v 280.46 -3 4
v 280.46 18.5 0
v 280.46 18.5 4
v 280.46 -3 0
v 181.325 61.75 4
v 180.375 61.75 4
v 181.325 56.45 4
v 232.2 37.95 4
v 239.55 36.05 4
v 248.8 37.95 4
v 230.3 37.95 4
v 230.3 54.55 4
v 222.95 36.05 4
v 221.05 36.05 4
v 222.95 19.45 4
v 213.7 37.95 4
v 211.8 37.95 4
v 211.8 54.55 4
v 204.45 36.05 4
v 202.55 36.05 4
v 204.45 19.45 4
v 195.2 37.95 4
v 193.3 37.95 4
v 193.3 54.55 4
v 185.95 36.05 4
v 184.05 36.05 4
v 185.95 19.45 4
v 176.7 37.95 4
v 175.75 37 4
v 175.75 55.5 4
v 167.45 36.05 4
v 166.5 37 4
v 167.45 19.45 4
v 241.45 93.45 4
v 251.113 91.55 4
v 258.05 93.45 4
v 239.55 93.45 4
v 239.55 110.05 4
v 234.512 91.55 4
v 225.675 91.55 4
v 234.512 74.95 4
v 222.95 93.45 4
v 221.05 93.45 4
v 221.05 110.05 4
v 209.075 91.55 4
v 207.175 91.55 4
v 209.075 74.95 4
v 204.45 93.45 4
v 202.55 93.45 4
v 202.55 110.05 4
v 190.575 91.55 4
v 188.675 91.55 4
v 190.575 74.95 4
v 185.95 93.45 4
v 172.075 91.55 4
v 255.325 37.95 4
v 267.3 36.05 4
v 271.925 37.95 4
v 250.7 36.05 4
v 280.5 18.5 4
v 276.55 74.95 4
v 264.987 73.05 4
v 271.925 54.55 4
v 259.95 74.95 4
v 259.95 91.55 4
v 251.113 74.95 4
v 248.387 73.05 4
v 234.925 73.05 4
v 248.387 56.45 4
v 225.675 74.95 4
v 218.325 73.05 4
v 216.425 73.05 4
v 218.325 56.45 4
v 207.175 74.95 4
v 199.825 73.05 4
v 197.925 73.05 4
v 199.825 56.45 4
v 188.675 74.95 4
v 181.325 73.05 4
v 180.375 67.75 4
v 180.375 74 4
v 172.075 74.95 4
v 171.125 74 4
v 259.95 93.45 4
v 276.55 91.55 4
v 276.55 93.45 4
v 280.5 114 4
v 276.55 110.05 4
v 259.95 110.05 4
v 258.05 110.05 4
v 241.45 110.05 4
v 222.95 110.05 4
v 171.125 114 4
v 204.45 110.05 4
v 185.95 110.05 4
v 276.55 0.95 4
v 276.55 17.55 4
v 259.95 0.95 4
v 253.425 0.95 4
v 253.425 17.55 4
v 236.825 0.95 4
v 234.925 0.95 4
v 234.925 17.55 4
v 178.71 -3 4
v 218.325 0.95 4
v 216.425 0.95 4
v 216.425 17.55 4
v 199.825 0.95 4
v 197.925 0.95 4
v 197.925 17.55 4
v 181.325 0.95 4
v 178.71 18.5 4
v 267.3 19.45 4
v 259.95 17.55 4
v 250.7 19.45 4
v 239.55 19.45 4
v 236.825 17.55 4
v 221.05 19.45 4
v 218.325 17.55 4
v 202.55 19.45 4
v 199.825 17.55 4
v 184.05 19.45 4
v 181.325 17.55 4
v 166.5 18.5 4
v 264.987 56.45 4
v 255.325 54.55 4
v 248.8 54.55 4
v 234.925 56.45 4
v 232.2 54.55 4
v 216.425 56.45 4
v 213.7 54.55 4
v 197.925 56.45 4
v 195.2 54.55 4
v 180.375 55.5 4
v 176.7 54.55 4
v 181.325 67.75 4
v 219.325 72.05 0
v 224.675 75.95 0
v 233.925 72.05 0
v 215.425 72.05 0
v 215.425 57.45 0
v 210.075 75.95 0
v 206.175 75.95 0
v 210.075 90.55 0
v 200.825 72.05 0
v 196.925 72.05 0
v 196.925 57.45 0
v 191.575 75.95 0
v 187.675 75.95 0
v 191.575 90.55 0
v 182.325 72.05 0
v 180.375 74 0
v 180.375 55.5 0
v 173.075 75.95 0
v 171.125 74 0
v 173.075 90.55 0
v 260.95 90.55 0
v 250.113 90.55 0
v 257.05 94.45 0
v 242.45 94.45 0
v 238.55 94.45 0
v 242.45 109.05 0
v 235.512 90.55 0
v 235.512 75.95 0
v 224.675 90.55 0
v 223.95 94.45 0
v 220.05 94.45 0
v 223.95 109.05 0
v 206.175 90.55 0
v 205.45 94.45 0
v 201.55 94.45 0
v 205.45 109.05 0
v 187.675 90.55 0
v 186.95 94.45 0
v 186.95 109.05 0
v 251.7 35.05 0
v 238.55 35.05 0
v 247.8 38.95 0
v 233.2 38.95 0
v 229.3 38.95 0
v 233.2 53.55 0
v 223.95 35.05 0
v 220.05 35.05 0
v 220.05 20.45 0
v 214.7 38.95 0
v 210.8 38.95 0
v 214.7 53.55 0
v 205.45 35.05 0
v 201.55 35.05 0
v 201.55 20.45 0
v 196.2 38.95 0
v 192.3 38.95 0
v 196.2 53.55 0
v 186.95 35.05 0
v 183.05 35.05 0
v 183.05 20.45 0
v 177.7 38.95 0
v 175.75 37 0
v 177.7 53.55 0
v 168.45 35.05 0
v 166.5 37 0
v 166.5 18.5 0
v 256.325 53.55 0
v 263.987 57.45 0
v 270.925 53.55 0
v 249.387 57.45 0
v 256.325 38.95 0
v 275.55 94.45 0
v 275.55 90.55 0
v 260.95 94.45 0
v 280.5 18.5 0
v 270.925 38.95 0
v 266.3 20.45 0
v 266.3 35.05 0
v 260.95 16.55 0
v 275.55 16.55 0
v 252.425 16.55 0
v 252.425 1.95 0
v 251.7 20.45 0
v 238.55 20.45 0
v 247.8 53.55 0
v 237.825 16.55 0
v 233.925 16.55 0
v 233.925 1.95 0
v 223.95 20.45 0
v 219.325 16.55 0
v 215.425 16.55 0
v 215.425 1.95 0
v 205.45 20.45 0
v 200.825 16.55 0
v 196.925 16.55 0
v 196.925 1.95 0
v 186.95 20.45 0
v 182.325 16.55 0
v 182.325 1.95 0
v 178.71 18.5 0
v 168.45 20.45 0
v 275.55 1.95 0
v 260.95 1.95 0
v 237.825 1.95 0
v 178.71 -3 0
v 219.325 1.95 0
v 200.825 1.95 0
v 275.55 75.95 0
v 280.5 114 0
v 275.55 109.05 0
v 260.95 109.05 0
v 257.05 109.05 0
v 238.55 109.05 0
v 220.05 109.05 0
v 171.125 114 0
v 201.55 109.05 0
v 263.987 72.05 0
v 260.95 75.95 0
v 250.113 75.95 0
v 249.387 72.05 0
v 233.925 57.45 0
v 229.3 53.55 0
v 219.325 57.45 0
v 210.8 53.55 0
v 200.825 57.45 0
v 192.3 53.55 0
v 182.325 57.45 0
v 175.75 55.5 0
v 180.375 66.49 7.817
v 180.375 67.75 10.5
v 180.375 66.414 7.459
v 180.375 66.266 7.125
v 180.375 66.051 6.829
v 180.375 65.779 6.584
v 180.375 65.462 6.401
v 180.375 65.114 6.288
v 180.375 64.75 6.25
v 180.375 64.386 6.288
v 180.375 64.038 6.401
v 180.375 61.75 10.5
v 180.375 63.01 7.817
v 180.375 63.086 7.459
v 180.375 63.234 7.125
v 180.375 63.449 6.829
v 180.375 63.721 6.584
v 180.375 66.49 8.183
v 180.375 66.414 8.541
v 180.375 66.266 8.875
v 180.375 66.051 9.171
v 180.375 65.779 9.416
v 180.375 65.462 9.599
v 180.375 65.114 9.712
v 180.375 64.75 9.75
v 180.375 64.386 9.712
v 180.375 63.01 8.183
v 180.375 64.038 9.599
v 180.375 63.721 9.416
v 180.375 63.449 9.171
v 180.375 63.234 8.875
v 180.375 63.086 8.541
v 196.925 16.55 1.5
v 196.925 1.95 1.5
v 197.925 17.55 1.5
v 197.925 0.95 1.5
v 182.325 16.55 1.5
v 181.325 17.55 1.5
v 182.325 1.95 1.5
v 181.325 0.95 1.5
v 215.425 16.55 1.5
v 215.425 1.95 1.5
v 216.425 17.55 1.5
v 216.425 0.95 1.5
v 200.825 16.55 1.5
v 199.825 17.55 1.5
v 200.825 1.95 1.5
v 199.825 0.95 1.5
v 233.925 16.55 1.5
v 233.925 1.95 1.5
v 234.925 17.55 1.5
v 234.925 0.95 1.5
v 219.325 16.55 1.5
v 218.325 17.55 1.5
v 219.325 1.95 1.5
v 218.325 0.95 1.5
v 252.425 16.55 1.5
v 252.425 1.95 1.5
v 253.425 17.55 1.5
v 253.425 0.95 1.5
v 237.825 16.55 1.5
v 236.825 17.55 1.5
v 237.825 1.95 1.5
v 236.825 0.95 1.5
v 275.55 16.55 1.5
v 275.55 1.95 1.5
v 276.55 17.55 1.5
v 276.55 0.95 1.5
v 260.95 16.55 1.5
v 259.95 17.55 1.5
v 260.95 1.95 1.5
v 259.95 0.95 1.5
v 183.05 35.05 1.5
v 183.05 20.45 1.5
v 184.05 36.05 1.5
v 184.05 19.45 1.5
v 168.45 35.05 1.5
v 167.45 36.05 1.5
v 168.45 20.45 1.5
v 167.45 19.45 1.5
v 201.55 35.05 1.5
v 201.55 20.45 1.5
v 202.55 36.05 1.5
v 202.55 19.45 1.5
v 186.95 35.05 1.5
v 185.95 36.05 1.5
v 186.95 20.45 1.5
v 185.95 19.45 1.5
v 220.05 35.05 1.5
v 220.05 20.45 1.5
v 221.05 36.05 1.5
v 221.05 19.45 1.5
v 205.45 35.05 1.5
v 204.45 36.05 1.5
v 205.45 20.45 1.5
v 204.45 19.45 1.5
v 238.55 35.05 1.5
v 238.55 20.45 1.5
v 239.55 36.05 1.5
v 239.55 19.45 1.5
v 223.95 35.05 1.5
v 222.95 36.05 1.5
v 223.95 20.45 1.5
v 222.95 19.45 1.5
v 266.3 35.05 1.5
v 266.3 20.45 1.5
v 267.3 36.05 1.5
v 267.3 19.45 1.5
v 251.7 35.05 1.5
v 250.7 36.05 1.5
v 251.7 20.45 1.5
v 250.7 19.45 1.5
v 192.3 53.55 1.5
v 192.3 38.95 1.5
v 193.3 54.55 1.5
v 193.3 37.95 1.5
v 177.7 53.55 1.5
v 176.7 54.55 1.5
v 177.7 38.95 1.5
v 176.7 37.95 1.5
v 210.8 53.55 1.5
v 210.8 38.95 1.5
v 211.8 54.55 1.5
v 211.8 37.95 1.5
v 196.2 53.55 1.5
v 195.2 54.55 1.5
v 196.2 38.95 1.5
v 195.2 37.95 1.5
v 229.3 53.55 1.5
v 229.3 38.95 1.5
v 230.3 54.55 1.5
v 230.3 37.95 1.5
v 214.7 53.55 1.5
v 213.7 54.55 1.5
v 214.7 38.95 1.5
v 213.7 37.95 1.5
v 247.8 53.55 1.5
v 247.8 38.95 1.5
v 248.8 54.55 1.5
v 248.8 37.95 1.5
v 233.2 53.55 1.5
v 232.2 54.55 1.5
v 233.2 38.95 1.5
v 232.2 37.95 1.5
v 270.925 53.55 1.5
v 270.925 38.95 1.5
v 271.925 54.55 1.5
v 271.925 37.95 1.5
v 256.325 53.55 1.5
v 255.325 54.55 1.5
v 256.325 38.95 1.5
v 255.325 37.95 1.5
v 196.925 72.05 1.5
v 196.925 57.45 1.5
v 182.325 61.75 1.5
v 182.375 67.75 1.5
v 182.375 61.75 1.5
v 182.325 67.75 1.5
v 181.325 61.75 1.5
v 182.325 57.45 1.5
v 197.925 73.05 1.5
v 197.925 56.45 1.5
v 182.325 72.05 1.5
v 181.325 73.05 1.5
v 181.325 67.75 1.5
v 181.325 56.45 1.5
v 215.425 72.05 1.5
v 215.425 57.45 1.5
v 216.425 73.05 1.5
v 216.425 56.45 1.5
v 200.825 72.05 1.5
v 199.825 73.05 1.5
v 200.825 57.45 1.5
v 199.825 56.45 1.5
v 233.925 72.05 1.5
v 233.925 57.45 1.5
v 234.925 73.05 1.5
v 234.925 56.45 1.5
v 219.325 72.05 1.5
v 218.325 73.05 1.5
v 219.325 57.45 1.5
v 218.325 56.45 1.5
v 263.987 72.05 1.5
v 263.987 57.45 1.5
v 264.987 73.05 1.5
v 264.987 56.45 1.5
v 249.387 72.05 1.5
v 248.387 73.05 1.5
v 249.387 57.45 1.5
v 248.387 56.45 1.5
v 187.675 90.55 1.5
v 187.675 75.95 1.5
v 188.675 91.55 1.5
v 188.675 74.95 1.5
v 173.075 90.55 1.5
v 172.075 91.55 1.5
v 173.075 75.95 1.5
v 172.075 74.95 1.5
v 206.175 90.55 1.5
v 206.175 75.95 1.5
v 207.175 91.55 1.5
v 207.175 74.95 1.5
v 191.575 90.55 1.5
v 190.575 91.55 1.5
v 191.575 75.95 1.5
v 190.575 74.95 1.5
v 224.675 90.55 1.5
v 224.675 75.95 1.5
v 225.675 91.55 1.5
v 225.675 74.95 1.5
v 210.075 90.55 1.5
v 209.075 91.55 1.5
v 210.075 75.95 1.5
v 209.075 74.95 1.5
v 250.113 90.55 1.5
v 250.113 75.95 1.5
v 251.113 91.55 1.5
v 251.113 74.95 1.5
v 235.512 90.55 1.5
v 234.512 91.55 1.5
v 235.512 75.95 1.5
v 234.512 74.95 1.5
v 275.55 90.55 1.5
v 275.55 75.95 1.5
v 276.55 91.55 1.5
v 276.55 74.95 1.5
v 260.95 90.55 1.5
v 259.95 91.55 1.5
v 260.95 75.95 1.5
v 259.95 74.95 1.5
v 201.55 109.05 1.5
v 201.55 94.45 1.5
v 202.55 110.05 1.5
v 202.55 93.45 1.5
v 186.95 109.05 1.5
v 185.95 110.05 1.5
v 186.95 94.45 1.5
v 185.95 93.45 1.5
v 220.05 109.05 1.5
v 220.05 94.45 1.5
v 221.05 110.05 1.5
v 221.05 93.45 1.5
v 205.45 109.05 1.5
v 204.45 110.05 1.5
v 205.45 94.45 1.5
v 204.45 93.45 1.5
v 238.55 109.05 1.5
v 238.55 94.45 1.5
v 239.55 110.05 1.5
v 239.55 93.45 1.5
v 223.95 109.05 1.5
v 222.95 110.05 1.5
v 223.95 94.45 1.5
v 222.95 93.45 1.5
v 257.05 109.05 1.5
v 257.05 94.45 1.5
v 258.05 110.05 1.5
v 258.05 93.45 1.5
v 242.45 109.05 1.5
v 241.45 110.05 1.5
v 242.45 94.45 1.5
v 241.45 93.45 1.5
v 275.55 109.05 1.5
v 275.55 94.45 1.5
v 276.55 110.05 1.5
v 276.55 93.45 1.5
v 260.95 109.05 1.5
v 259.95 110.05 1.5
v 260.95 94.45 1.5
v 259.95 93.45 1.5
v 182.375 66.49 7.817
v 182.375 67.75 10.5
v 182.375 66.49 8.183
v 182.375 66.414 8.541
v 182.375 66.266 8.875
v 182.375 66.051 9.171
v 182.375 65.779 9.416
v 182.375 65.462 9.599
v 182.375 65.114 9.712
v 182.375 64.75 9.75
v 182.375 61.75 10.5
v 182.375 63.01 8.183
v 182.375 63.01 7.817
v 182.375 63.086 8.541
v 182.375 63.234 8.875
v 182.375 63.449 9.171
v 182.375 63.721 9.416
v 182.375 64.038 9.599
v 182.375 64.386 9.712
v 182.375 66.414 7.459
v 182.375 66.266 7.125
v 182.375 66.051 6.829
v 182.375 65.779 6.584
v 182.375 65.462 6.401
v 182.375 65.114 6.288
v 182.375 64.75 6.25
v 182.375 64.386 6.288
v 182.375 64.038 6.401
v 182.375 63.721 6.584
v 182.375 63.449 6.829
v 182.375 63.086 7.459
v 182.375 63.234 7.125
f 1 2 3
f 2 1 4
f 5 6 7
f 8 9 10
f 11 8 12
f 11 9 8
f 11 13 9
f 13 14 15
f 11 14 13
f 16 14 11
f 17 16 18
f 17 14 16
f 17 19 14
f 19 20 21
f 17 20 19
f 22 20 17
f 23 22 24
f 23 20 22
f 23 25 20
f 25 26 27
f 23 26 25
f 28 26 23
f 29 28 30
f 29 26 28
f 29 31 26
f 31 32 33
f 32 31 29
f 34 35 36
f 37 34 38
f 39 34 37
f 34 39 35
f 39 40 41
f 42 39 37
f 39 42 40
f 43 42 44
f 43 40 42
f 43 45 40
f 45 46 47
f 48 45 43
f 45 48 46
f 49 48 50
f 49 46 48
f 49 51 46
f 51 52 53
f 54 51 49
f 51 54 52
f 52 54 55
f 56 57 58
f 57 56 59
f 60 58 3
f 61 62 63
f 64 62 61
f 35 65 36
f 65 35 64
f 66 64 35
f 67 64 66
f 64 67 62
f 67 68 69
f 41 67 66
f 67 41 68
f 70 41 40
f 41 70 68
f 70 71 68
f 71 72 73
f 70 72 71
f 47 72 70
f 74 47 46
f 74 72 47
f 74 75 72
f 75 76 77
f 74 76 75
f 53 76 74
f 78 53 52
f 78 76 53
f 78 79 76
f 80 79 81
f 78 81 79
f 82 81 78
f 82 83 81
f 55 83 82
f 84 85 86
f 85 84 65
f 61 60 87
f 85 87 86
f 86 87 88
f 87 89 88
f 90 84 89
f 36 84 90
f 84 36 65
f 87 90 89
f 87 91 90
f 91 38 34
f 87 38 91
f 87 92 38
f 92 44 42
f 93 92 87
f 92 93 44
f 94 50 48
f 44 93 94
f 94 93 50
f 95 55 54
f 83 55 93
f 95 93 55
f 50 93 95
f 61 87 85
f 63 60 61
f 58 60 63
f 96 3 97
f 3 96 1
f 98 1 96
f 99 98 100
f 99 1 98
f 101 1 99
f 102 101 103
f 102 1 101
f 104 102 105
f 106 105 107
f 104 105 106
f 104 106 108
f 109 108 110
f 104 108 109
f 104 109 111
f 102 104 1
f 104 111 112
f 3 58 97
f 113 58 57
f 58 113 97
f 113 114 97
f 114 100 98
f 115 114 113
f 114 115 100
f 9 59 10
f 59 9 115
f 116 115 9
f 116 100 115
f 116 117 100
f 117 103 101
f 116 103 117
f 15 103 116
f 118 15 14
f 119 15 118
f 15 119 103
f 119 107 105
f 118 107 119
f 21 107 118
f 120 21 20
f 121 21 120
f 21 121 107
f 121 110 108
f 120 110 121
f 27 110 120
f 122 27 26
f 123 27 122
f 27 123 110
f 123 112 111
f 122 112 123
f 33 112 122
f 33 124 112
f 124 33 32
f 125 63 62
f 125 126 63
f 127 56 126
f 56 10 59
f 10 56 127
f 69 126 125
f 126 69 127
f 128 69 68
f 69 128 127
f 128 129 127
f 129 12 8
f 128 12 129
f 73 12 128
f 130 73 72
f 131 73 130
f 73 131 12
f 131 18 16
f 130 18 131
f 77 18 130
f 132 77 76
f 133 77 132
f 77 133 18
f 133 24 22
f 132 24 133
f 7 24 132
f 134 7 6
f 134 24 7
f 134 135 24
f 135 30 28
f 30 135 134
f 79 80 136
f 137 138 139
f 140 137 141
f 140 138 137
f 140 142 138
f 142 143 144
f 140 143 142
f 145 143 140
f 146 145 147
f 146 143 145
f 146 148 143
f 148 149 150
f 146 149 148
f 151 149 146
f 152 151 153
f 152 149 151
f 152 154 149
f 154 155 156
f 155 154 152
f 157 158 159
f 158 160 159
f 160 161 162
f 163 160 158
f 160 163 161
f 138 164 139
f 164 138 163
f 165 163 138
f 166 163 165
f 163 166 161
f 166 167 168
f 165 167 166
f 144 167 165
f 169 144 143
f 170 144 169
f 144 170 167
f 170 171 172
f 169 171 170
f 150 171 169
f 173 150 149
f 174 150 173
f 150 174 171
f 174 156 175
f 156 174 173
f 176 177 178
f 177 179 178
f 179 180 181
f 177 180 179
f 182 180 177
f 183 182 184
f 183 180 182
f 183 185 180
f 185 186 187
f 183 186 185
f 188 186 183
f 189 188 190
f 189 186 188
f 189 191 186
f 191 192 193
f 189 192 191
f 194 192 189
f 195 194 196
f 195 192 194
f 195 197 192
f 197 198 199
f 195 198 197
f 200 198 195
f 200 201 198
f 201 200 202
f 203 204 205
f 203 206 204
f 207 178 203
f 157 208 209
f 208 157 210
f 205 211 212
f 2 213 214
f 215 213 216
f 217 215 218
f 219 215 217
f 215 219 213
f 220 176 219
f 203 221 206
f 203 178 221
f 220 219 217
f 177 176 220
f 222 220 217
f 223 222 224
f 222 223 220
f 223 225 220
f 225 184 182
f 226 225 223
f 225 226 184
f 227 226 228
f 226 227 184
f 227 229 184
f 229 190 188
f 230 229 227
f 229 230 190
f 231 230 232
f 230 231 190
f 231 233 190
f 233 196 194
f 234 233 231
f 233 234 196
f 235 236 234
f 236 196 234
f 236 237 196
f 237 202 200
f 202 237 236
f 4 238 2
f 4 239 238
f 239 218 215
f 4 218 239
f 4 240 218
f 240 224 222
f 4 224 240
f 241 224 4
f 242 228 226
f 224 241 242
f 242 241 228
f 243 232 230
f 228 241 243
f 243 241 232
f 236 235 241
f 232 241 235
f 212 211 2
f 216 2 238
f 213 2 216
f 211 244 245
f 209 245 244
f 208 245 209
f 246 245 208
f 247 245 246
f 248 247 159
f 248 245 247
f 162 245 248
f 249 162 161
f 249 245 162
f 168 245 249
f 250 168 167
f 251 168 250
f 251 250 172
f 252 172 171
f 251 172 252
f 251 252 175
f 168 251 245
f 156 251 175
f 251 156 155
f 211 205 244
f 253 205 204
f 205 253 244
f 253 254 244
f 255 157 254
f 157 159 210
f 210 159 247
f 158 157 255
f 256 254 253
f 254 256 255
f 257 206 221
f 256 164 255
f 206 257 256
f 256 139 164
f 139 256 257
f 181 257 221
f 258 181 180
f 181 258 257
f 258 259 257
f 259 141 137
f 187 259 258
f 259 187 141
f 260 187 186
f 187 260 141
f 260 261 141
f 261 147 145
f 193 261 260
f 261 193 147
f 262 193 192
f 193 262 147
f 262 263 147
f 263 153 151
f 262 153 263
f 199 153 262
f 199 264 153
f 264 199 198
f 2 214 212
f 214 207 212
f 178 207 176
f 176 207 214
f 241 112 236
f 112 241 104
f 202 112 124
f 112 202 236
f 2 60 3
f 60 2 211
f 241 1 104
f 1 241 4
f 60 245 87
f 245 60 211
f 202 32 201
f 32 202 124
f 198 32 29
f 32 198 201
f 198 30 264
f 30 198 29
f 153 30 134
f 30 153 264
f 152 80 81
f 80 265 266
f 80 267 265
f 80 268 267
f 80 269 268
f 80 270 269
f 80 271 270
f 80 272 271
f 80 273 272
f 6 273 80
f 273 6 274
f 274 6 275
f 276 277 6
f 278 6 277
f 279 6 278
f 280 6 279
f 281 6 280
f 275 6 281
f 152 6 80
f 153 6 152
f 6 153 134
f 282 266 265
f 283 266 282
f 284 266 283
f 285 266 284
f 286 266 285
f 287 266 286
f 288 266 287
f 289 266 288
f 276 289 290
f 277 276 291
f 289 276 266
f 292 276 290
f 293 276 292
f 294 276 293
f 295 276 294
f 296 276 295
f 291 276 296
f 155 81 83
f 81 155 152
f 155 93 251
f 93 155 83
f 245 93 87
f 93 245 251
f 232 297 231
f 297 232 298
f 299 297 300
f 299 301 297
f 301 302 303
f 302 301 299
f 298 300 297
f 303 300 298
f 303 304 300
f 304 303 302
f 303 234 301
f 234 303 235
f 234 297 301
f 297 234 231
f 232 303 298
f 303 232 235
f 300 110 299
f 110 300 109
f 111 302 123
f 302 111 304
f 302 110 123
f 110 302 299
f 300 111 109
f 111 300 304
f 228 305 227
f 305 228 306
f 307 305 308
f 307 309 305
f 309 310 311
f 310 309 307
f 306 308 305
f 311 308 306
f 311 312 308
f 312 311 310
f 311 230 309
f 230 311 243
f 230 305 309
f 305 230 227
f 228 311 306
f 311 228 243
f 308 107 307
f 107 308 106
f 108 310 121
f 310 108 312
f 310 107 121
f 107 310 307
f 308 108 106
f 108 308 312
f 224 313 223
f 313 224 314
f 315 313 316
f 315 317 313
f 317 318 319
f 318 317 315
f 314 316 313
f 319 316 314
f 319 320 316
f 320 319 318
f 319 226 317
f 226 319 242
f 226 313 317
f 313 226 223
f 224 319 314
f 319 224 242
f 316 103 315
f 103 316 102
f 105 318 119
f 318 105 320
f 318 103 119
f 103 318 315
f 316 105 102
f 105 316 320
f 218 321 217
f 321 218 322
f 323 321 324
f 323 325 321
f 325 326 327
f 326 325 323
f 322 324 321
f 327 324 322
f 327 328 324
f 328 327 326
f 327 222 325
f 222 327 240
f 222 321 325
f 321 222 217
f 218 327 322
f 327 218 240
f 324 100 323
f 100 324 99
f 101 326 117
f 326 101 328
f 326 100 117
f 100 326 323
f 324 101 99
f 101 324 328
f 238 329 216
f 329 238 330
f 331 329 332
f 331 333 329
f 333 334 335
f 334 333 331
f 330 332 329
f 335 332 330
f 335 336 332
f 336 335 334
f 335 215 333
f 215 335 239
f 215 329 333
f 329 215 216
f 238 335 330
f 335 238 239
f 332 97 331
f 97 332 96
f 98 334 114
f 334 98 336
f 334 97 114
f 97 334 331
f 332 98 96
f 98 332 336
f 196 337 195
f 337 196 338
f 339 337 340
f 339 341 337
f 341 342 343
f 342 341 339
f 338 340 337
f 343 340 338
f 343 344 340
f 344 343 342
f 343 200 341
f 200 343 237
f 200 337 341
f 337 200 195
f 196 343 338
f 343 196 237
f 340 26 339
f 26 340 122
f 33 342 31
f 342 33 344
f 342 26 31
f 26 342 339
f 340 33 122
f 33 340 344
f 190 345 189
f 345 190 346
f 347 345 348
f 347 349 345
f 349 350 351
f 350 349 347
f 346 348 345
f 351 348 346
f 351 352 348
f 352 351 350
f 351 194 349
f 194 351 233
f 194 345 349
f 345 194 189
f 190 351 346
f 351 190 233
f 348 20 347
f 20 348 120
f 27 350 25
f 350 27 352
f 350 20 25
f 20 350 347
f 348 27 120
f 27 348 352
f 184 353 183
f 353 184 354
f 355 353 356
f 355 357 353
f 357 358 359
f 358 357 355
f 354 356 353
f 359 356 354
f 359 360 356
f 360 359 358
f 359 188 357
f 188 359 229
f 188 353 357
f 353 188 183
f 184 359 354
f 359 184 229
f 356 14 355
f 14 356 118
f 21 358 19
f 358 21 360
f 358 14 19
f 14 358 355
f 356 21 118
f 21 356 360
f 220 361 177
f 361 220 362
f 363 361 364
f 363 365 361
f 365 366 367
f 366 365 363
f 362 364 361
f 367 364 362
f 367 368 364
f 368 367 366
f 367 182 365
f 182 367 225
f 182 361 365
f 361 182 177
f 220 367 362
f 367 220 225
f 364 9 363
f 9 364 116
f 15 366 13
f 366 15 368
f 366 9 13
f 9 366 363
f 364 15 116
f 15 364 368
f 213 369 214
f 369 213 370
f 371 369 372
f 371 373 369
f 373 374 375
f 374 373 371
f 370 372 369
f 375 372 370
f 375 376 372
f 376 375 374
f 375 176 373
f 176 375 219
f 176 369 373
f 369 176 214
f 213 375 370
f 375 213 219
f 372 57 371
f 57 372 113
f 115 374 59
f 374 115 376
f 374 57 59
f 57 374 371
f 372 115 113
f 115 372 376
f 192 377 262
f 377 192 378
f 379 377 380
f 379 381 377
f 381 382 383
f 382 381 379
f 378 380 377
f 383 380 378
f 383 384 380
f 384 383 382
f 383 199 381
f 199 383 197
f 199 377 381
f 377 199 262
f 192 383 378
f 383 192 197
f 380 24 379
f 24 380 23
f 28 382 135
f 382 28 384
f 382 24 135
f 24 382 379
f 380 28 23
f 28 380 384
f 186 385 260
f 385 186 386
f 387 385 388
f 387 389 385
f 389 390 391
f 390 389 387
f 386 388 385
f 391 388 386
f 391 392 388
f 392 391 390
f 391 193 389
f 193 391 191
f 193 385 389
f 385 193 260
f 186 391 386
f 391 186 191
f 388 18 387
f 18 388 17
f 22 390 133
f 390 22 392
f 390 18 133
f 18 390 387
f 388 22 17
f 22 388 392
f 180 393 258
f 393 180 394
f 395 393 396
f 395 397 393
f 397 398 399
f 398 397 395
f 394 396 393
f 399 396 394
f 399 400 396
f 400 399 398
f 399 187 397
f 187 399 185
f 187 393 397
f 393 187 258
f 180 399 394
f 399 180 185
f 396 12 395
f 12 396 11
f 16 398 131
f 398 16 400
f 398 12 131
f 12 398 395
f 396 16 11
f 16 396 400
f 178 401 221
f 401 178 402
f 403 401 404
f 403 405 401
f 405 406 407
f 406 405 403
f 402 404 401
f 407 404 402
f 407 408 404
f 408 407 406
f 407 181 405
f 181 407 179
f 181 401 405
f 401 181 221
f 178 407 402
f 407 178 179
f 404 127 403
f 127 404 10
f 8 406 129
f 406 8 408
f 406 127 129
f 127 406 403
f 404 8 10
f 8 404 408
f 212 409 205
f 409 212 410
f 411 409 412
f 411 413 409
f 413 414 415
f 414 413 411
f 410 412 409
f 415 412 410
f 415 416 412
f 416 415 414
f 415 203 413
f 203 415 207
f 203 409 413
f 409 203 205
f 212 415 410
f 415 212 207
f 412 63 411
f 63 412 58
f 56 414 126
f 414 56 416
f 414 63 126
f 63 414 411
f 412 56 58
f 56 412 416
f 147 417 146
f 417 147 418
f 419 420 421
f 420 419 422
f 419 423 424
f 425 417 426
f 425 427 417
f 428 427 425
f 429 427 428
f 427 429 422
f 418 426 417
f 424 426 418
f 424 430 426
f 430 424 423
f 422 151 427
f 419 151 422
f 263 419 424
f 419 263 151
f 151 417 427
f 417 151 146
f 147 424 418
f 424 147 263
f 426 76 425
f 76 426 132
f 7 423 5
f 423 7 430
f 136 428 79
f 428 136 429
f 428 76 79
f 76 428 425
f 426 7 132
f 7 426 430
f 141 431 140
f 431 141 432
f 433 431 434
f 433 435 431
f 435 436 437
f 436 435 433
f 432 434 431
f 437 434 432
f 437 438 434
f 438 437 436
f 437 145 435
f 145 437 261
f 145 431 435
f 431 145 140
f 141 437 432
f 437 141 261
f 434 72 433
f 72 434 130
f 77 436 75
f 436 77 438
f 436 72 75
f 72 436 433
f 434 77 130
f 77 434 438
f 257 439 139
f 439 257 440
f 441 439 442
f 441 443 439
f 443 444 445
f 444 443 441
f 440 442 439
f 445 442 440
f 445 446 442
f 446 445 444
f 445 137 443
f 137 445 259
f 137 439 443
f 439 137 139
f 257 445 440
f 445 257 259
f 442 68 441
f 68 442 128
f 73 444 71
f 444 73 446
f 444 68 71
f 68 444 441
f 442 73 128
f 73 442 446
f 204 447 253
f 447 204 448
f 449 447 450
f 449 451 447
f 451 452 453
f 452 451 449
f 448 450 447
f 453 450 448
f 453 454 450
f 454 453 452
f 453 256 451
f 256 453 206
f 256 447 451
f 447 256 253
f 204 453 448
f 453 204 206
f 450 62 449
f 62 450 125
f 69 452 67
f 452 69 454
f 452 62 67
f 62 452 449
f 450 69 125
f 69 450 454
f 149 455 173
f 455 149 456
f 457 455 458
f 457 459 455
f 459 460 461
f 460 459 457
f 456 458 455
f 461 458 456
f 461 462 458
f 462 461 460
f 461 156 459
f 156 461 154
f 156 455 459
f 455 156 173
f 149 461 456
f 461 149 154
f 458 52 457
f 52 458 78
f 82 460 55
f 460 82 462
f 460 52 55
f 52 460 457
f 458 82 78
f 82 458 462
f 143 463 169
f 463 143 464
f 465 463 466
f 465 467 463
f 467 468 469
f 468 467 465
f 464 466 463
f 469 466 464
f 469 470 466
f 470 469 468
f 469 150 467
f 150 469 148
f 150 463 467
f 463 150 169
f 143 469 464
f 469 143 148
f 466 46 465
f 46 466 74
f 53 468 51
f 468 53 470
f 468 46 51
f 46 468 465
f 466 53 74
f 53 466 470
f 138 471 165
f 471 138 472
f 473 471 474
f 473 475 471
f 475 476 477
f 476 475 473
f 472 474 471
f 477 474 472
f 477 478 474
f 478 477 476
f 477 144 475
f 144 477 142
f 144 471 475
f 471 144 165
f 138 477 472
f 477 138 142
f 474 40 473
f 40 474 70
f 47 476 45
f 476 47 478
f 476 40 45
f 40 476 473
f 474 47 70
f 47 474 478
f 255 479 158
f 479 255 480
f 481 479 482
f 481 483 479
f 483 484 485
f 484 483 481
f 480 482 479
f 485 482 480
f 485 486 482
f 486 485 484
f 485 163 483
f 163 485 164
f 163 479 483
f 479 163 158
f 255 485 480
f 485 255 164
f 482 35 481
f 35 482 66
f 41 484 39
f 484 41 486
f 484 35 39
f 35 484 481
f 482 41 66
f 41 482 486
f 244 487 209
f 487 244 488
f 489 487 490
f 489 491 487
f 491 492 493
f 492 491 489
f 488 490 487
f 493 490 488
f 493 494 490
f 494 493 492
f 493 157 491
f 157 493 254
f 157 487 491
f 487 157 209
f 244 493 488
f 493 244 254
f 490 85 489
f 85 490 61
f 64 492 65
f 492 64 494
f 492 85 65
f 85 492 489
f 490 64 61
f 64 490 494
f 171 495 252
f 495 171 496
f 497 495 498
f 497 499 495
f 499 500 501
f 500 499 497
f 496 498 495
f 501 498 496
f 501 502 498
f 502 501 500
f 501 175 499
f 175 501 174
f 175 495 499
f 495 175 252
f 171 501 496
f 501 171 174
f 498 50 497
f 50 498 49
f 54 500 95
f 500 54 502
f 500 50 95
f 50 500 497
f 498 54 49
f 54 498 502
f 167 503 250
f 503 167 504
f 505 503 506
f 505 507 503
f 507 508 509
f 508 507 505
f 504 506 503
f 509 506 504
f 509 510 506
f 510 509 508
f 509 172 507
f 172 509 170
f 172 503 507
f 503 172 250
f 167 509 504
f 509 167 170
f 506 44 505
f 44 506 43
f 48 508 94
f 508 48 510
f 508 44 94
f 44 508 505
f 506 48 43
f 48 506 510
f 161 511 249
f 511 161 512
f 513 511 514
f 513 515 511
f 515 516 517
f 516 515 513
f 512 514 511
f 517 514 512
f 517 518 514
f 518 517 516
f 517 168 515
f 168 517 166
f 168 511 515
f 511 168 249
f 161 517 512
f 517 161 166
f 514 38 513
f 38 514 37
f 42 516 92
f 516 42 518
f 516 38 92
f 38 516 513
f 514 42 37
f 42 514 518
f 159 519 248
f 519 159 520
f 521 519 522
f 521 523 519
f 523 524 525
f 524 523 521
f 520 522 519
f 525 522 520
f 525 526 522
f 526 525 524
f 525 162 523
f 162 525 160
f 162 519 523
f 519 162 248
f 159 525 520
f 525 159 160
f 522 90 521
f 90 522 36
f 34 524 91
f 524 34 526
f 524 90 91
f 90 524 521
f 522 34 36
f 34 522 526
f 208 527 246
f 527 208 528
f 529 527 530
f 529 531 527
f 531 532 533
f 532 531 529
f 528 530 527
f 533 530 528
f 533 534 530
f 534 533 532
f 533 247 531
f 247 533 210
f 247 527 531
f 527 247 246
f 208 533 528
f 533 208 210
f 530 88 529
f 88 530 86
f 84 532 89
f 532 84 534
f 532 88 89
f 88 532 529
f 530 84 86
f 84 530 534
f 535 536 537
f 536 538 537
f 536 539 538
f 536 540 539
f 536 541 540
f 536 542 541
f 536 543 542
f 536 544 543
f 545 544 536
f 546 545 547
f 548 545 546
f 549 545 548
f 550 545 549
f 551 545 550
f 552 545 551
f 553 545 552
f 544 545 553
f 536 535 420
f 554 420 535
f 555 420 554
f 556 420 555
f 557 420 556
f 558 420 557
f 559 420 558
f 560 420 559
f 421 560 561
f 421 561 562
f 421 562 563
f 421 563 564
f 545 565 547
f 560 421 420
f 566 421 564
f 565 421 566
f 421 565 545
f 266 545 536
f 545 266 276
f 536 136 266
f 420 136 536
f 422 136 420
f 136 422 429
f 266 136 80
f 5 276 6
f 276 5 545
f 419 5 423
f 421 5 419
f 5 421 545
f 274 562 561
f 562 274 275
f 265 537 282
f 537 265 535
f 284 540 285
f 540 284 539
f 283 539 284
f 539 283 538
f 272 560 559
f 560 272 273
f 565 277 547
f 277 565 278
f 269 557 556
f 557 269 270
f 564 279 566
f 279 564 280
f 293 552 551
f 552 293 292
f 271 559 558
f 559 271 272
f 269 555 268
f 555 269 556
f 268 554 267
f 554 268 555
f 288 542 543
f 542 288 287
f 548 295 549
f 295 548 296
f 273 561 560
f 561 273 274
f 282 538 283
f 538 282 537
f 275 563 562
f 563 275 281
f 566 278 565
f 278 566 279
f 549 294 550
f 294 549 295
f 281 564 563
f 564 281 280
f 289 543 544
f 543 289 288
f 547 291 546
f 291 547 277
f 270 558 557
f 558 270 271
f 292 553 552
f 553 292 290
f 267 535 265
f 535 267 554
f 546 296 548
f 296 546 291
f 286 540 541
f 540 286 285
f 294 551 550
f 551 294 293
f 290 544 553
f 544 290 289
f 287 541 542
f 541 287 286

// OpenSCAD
// file: layout.scad
module switchHoles()
{
translate([9.25,9.25,0])
{
children(0);
}
translate([32.375,9.25,0])
{
children(0);
}
translate([50.875,9.25,0])
{
children(0);
}
translate([69.375,9.25,0])
{
children(0);
}
translate([87.875,9.25,0])
{
children(0);
}
translate([111.0,9.25,0])
{
children(0);
}
translate([129.5,9.25,0])
{
children(0);
}
translate([148.0,9.25,0])
{
children(0);
}
translate([166.5,9.25,0])
{
children(0);
}
translate([189.625,9.25,0])
{
children(0);
}
translate([208.125,9.25,0])
{
children(0);
}
translate([226.625,9.25,0])
{
children(0);
}
translate([245.125,9.25,0])
{
children(0);
}
translate([268.25,9.25,0])
{
children(0);
}
translate([9.25,27.75,0])
{
children(0);
}
translate([27.75,27.75,0])
{
children(0);
}
translate([46.25,27.75,0])
{
children(0);
}
translate([64.75,27.75,0])
{
children(0);
}
translate([83.25,27.75,0])
{
children(0);
}
translate([101.75,27.75,0])
{
children(0);
}
translate([120.25,27.75,0])
{
children(0);
}
translate([138.75,27.75,0])
{
children(0);
}
translate([157.25,27.75,0])
{
children(0);
}
translate([175.75,27.75,0])
{
children(0);
}
translate([194.25,27.75,0])
{
children(0);
}
translate([212.75,27.75,0])
{
children(0);
}
translate([231.25,27.75,0])
{
children(0);
}
translate([259.0,27.75,0])
{
children(0);
}
translate([13.875,46.25,0])
{
children(0);
}
translate([37.0,46.25,0])
{
children(0);
}
translate([55.5,46.25,0])
{
children(0);
}
translate([74.0,46.25,0])
{
children(0);
}
translate([92.5,46.25,0])
{
children(0);
}
translate([111.0,46.25,0])
{
children(0);
}
translate([129.5,46.25,0])
{
children(0);
}
translate([148.0,46.25,0])
{
children(0);
}
translate([166.5,46.25,0])
{
children(0);
}
translate([185.0,46.25,0])
{
children(0);
}
translate([203.5,46.25,0])
{
children(0);
}
translate([222.0,46.25,0])
{
children(0);
}
translate([240.5,46.25,0])
{
children(0);
}
translate([263.625,46.25,0])
{
children(0);
}
translate([16.1875,64.75,0])
{
children(0);
}
translate([41.625,64.75,0])
{
children(0);
}
translate([60.125,64.75,0])
{
children(0);
}
translate([78.625,64.75,0])
{
children(0);
}
translate([97.125,64.75,0])
{
children(0);
}
translate([115.625,64.75,0])
{
children(0);
}
translate([134.125,64.75,0])
{
children(0);
}
translate([152.625,64.75,0])
{
children(0);
}
translate([171.125,64.75,0])
{
children(0);
}
translate([189.625,64.75,0])
{
children(0);
}
translate([208.125,64.75,0])
{
children(0);
}
translate([226.625,64.75,0])
{
children(0);
}
translate([256.6875,64.75,0])
{
children(0);
}
translate([11.5625,83.25,0])
{
children(0);
}
translate([32.375,83.25,0])
{
children(0);
}
translate([50.875,83.25,0])
{
children(0);
}
translate([69.375,83.25,0])
{
children(0);
}
translate([87.875,83.25,0])
{
children(0);
}
translate([106.375,83.25,0])
{
children(0);
}
translate([124.875,83.25,0])
{
children(0);
}
translate([143.375,83.25,0])
{
children(0);
}
translate([161.875,83.25,0])
{
children(0);
}
translate([180.375,83.25,0])
{
children(0);
}
translate([198.875,83.25,0])
{
children(0);
}
translate([217.375,83.25,0])
{
children(0);
}
translate([242.8125,83.25,0])
{
children(0);
}
translate([268.25,83.25,0])
{
children(0);
}
translate([11.5625,101.75,0])
{
children(0);
}
translate([32.375,101.75,0])
{
children(0);
}
translate([50.875,101.75,0])
{
children(0);
}
translate([69.375,101.75,0])
{
children(0);
}
translate([131.8125,101.75,0])
{
children(0);
}
translate([194.25,101.75,0])
{
children(0);
}
translate([212.75,101.75,0])
{
children(0);
}
translate([231.25,101.75,0])
{
children(0);
}
translate([249.75,101.75,0])
{
children(0);
}
translate([268.25,101.75,0])
{
children(0);
}
}

switchHoles()
cube([14,14,1]);
// main file
use <layout.scad>

$fn=30;

module switchHole()
{
    innerHeight = 1.5;
    outerHeight = 100;

    padding = 0.3;
    innerWidth = 14 + padding * 2;
    outerWidth = 16 + padding * 2;
    innerSize = [innerWidth, innerWidth, innerHeight];
    outerSize = [outerWidth, outerWidth, outerHeight];

    
    union()
    {
        translate(-[innerWidth / 2, innerWidth / 2, 0])
        cube(innerSize);

        translate([-outerWidth / 2, -outerWidth / 2, innerHeight])
        cube(outerSize);
    }
}

STD_SIZE = 18.5;
FRAME_PADDING = 3;

module part1()
{
    difference()
    {
        //translate([-2, -2, 0])
        //cube([60, 113, 4]);
        translate([-FRAME_PADDING, 0, 0])
        union()
        {
            translate([0,-FRAME_PADDING, 0])
            cube([STD_SIZE * 4 +STD_SIZE*0.25 + FRAME_PADDING, STD_SIZE + FRAME_PADDING, 4]);
            translate([0,STD_SIZE])
            cube([STD_SIZE * 4 + FRAME_PADDING, STD_SIZE, 4]);
            translate([0,STD_SIZE * 2])
            cube([1.5 * STD_SIZE + STD_SIZE * 3 + FRAME_PADDING, STD_SIZE, 4]);
            translate([0,STD_SIZE * 3])
            cube([1.75 * STD_SIZE + STD_SIZE * 3 + FRAME_PADDING, STD_SIZE, 4]);
            translate([0,STD_SIZE * 4])
            cube([1.25 * STD_SIZE + STD_SIZE * 3 + FRAME_PADDING, STD_SIZE, 4]);
            translate([0,STD_SIZE * 5])
            cube([1.25 * STD_SIZE + STD_SIZE * 3 + FRAME_PADDING, STD_SIZE + FRAME_PADDING, 4]);
        }
        switchHoles()
        //cube([14,14,1]);
        switchHole();
    }

    SCREWBLOCK_WIDTH = 6;
    translate([1.75 * STD_SIZE + STD_SIZE * 3 - 2, STD_SIZE * 3.5 - SCREWBLOCK_WIDTH / 2, 1.5])
    {
        difference()
        {
            cube([2,SCREWBLOCK_WIDTH, 6.5+ 4 - 1.5]);
            translate([0,SCREWBLOCK_WIDTH / 2,4 - 1.5 + 4])
            rotate(90, [0,1,0])
            cylinder(d = 3.5, h = 10);
        }
    }
}

module part2()
{
    difference()
    {
        //translate([-2, -2, 0])
        //cube([60, 113, 4]);
        //translate([-FRAME_PADDING, 0, 0])
        union()
        {
            translate([STD_SIZE * 4 +STD_SIZE*0.25,-FRAME_PADDING, 0])
            cube([STD_SIZE * 5 +STD_SIZE*0.25 + FRAME_PADDING, STD_SIZE + FRAME_PADDING, 4]);
            translate([STD_SIZE * 4,STD_SIZE])
            cube([STD_SIZE * 5, STD_SIZE, 4]);
            translate([1.5 * STD_SIZE + STD_SIZE * 3,STD_SIZE * 2])
            cube([STD_SIZE * 5, STD_SIZE, 4]);
            translate([1.75 * STD_SIZE + STD_SIZE * 3,STD_SIZE * 3])
            cube([STD_SIZE * 5, STD_SIZE, 4]);
            translate([1.25 * STD_SIZE + STD_SIZE * 3,STD_SIZE * 4])
            cube([STD_SIZE * 5, STD_SIZE, 4]);
            translate([1.25 * STD_SIZE + STD_SIZE * 3,STD_SIZE * 5])
            cube([STD_SIZE * 5, STD_SIZE + FRAME_PADDING, 4]);
        }
        switchHoles()
        //cube([14,14,1]);
        switchHole();
    }

    SCREWBLOCK_WIDTH = 6;
    translate([1.75 * STD_SIZE + STD_SIZE * 3, STD_SIZE * 3.5 - SCREWBLOCK_WIDTH / 2, 1.5])
    {
        difference()
        {
            cube([2,SCREWBLOCK_WIDTH, 6.5+ 4 - 1.5]);
            translate([0,SCREWBLOCK_WIDTH / 2,4 - 1.5 + 4])
            rotate(90, [0,1,0])
            cylinder(d = 3.5, h = 10);
        }
    }
    SCREWBLOCK_WIDTH = 6;
    translate([1.75 * STD_SIZE + STD_SIZE * 8 - 2, STD_SIZE * 3.5 - SCREWBLOCK_WIDTH / 2, 1.5])
    {
        difference()
        {
            cube([2,SCREWBLOCK_WIDTH, 6.5+ 4 - 1.5]);
            translate([0,SCREWBLOCK_WIDTH / 2,4 - 1.5 + 4])
            rotate(90, [0,1,0])
            cylinder(d = 3.5, h = 10);
        }
    }
}
module part3()
{
    difference()
    {
        //translate([-2, -2, 0])
        //cube([60, 113, 4]);
        //translate([-FRAME_PADDING, 0, 0])
        union()
        {
            translate([STD_SIZE * 9 + STD_SIZE * 0.66,-FRAME_PADDING, 0])
            cube([STD_SIZE * 5 + STD_SIZE*0.5 , STD_SIZE + FRAME_PADDING, 4]);

            translate([STD_SIZE * 9,STD_SIZE, 0])
            cube([STD_SIZE * 4 + STD_SIZE * 2 + FRAME_PADDING, STD_SIZE, 4]);

            translate([1.5 * STD_SIZE + STD_SIZE * 8,STD_SIZE * 2])
            cube([STD_SIZE * 4 + STD_SIZE * 1.5 + FRAME_PADDING, STD_SIZE, 4]);

            translate([1.75 * STD_SIZE + STD_SIZE * 8,STD_SIZE * 3])
            cube([STD_SIZE * 3 + STD_SIZE * 2.25 + FRAME_PADDING, STD_SIZE, 4]);

            translate([1.25 * STD_SIZE + STD_SIZE * 8,STD_SIZE * 4])
            cube([STD_SIZE * 4 + STD_SIZE * 1.75 + FRAME_PADDING, STD_SIZE, 4]);

            translate([1.25 * STD_SIZE + STD_SIZE * 8,STD_SIZE * 5])
            cube([STD_SIZE * 4 + STD_SIZE * 1.75 + FRAME_PADDING, STD_SIZE + FRAME_PADDING, 4]);
        }
        switchHoles()
        //cube([14,14,1]);
        switchHole();
    }

    SCREWBLOCK_WIDTH = 6;
    translate([1.75 * STD_SIZE + STD_SIZE * 8, STD_SIZE * 3.5 - SCREWBLOCK_WIDTH / 2, 1.5])
    {
        difference()
        {
            cube([2,SCREWBLOCK_WIDTH, 6.5+ 4 - 1.5]);
            translate([0,SCREWBLOCK_WIDTH / 2,4 - 1.5 + 4])
            rotate(90, [0,1,0])
            cylinder(d = 3.5, h = 10);
        }
    }
}

//part1();
//part2();
part3();
